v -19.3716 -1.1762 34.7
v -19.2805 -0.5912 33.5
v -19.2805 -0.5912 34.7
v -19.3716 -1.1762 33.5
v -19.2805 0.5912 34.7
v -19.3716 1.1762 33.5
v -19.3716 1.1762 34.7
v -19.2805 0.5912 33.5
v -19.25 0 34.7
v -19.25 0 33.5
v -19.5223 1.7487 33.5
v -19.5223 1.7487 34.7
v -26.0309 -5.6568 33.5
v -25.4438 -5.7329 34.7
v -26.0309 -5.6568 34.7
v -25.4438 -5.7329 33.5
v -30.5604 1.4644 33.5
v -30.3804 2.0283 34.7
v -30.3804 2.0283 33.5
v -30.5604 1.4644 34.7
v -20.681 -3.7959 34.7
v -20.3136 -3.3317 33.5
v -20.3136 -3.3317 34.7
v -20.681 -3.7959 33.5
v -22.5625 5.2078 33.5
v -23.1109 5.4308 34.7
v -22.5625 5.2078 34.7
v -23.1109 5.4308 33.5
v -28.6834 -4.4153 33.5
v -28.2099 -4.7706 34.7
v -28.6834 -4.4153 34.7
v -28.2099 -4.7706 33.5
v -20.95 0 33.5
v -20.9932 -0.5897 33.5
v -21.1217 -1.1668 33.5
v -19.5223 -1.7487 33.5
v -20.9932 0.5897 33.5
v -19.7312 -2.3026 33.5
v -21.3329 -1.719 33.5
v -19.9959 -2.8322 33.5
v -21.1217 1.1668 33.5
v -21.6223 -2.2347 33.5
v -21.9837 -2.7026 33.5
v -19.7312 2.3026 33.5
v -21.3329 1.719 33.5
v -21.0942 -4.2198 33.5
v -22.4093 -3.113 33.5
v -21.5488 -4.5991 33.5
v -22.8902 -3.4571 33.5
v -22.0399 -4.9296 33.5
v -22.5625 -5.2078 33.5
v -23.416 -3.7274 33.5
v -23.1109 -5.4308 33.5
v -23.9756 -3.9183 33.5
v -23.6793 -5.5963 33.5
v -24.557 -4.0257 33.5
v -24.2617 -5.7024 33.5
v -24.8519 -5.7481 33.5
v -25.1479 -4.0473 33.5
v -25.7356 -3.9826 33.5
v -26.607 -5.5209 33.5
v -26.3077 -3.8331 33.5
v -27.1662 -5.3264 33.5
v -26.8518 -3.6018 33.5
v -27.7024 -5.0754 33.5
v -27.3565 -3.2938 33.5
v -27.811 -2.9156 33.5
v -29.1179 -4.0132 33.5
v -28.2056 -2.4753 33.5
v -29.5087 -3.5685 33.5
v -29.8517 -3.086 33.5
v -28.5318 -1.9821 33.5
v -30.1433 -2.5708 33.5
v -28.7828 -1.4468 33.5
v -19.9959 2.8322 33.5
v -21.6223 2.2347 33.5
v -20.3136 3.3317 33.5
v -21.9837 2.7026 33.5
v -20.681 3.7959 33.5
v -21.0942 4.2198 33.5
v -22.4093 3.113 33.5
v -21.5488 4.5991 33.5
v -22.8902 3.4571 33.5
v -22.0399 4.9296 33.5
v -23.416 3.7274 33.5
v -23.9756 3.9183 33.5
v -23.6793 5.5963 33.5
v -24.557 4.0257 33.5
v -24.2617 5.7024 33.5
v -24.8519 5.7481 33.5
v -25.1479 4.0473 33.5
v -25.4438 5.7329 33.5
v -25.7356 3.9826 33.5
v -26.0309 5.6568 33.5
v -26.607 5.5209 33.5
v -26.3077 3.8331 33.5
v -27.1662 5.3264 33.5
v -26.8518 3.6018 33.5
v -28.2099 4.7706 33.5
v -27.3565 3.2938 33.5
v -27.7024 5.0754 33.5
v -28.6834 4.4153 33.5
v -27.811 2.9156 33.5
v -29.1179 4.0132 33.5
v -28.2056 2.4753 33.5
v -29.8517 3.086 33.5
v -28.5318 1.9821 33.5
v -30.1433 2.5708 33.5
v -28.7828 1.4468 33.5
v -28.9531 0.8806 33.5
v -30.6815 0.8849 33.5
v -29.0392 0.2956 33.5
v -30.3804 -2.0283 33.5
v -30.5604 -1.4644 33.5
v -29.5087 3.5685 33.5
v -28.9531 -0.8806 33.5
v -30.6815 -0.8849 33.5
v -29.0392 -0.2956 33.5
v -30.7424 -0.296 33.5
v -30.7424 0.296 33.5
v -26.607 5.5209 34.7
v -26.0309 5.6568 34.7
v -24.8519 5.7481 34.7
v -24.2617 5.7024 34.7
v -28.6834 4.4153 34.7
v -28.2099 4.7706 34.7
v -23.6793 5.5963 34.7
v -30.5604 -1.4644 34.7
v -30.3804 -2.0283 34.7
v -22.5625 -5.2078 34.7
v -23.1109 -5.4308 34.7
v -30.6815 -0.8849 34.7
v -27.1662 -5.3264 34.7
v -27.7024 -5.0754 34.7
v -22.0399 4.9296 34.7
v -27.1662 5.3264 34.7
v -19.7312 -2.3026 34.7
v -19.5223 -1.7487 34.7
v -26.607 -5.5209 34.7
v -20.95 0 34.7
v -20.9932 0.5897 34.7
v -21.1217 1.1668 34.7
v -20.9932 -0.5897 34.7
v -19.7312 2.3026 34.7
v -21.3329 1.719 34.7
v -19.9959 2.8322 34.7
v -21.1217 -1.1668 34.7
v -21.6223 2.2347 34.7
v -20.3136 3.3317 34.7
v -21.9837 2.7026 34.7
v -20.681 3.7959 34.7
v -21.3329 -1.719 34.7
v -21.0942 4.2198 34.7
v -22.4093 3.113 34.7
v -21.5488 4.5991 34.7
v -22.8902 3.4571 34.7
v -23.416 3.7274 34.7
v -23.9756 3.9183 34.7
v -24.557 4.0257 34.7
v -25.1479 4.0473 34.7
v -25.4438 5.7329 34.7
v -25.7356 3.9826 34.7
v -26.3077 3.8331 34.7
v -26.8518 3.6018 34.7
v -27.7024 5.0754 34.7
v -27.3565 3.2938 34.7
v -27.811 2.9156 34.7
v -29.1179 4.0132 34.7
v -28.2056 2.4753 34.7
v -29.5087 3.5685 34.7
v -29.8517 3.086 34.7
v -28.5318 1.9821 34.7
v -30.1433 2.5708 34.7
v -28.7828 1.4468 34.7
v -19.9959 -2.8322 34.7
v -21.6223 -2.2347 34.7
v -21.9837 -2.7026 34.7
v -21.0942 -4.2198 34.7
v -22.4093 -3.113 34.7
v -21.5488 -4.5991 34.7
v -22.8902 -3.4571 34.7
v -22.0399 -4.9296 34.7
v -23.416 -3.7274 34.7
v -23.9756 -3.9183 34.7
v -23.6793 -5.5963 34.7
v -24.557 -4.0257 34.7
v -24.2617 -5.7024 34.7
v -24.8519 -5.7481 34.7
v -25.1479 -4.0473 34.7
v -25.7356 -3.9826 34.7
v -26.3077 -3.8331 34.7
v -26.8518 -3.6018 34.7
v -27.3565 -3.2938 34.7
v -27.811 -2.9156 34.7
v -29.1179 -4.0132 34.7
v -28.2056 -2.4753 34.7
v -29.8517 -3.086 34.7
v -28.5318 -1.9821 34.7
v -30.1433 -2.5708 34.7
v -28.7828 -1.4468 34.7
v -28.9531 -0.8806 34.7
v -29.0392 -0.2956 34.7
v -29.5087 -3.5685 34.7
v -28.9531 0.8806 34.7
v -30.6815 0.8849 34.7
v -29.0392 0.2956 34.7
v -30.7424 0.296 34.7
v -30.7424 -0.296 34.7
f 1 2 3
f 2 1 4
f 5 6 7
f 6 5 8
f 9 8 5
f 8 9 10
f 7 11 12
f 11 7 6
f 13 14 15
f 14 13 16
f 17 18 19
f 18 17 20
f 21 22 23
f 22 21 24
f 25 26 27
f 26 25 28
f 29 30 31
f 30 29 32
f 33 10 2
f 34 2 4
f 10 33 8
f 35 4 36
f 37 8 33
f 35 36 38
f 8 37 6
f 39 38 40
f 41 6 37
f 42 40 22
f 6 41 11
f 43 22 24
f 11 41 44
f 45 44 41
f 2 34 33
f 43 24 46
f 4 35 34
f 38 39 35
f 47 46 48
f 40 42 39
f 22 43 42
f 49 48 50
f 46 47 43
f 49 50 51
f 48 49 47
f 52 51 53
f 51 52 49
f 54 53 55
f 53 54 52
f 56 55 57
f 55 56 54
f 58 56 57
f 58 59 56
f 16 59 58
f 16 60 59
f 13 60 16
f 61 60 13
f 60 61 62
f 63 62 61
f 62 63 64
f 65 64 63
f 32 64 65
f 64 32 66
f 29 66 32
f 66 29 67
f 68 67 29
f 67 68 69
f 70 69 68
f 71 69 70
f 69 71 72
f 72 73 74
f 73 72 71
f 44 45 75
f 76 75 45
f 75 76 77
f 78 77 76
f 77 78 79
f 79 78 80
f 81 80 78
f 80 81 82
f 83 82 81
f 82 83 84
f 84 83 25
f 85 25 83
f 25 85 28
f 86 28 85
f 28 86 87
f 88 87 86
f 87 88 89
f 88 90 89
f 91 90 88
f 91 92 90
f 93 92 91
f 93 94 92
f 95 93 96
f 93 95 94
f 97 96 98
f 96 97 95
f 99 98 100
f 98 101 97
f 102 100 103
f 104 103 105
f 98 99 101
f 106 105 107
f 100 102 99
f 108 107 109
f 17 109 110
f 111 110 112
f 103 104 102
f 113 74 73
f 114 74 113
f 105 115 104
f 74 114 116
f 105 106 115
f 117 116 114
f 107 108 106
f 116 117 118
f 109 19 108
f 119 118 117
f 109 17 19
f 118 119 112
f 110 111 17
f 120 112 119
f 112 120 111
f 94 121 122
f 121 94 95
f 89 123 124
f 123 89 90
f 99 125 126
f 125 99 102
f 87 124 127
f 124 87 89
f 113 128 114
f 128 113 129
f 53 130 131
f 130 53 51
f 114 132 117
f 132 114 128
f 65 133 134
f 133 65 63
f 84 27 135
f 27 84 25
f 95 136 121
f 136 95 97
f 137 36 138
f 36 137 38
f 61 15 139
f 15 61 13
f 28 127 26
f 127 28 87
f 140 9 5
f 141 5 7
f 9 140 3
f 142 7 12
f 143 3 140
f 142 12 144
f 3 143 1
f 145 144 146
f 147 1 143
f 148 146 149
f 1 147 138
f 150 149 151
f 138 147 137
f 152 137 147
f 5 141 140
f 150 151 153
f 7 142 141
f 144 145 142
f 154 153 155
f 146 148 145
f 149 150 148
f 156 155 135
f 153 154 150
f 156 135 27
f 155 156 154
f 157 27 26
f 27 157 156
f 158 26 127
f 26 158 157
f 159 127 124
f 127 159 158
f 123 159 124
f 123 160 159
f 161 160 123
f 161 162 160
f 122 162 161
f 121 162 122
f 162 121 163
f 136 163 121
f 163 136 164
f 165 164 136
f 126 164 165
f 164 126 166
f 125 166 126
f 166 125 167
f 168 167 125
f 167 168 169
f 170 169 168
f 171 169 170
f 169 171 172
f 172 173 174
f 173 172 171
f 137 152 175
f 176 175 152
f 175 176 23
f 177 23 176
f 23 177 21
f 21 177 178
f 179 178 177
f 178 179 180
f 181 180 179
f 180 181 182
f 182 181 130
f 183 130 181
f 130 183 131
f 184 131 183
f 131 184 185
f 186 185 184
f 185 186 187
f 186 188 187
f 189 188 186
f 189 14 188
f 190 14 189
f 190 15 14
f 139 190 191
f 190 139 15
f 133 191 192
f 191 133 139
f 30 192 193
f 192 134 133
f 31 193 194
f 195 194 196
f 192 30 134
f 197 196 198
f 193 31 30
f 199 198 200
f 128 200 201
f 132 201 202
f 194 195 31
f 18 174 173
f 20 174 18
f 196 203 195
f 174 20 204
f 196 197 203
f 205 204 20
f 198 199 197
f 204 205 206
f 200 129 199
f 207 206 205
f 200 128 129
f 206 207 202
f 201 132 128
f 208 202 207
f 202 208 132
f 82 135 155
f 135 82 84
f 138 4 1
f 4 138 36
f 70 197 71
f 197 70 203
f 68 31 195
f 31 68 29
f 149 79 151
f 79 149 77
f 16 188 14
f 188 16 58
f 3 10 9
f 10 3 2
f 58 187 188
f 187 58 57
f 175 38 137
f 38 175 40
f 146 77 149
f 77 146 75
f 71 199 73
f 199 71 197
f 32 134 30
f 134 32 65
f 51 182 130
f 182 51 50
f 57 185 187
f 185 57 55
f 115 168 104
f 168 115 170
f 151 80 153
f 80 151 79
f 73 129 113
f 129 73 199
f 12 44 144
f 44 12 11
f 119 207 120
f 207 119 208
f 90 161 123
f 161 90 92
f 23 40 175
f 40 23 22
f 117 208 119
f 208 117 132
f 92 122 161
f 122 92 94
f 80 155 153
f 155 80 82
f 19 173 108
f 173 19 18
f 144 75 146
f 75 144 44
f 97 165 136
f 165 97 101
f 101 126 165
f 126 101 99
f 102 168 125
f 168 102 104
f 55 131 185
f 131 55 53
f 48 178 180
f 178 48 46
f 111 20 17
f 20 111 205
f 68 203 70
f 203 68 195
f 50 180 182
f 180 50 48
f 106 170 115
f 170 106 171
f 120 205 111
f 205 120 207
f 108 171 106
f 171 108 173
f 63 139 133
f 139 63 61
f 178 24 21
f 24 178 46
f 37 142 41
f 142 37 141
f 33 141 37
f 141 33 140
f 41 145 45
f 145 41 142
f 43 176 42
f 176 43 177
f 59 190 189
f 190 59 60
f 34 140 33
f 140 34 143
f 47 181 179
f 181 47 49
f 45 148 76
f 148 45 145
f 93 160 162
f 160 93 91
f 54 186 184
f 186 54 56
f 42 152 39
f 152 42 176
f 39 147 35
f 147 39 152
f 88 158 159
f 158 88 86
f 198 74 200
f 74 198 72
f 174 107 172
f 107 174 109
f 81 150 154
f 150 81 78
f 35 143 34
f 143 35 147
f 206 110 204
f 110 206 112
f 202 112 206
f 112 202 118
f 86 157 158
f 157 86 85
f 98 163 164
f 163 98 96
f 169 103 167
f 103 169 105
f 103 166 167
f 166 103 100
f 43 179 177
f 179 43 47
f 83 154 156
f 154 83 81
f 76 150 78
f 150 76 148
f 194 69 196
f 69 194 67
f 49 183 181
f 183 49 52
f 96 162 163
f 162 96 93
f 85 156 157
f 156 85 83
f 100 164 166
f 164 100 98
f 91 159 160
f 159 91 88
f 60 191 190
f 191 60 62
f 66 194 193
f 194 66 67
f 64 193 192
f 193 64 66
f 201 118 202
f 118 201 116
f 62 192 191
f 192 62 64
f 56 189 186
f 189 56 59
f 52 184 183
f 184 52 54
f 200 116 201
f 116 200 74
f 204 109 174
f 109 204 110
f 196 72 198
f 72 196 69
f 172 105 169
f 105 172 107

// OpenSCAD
// file: ../../lib/common.scad
// ============================================================================
//  Вспомогательные модули общего назначения.
//  Подключать через use <lib/common.scad> — файл не содержит параметров
//  проекта и ни от чего не зависит.
// ============================================================================

_eps = 0.01;

// --------------------------------------------------------------------- 2D ---
// Прямоугольник со скруглёнными углами, по центру
module rrect(w, d, r) {
    rr = min(r, w/2 - _eps, d/2 - _eps);
    if (rr > 0) offset(r = rr) square([w - 2*rr, d - 2*rr], center = true);
    else square([w, d], center = true);
}

// --------------------------------------------------------------------- 3D ---
// Коробка со скруглением ТОЛЬКО вертикальных рёбер: нижние и верхние острые
module rounded_box(w, d, h, r) linear_extrude(height = h) rrect(w, d, r);

// Цилиндр с фасками на торцах (снимает «слоновью ногу» и облегчает посадку)
module chamfered_cyl(d, h, ch = 0.6, bottom = true, top = true) {
    r  = d/2;
    cb = bottom ? min(ch, h/2) : 0;
    ct = top    ? min(ch, h/2) : 0;
    if (cb <= 0 && ct <= 0) cylinder(d = d, h = h);
    else rotate_extrude(angle = 360) polygon(concat(
        [[0, 0]],
        cb > 0 ? [[r - cb, 0], [r, cb]] : [[r, 0]],
        ct > 0 ? [[r, h - ct], [r - ct, h]] : [[r, h]],
        [[0, h]]));
}

// Труба
module tube(od, id, h) difference() {
    cylinder(d = od, h = h);
    translate([0, 0, -_eps]) cylinder(d = id, h = h + 2*_eps);
}

// Сквозное отверстие, растянутое вверх-вниз для гарантированного вычитания
module thru(d, h) translate([0, 0, -_eps]) cylinder(d = d, h = h + 2*_eps);

// Потайное отверстие под саморез с конической головкой.
// Пластина занимает z = [0 .. t], головка утапливается сверху,
// саморез идёт вниз (в ответную стойку).
module countersunk_hole(free_d, head_d, t, down = 30) {
    cone_h = (head_d - free_d)/2;    // головка 90 градусов
    union() {
        translate([0, 0, -down]) cylinder(d = free_d, h = down + t - cone_h + _eps);
        translate([0, 0, t - cone_h]) cylinder(d1 = free_d, d2 = head_d, h = cone_h);
    }
}

// Паз (щелевое отверстие) длиной len по X, сквозной по высоте h
module slot(len, d, h) hull() for (s = [-1, 1])
    translate([s*(len - d)/2, 0, 0]) cylinder(d = d, h = h);

// Стойка под саморез: цилиндр с пилотным отверстием сверху.
// Снизу фаски нет — стойка растёт из дна детали.
module screw_boss(od, h, pilot_d, pilot_depth, ch = 0.6) difference() {
    chamfered_cyl(od, h, ch = ch, bottom = false, top = true);
    translate([0, 0, h - pilot_depth]) cylinder(d = pilot_d, h = pilot_depth + _eps);
}

// Треугольная косынка в плоскости XZ (катеты l по X и h по Z), толщина t по Y
module gusset(l, h, t) translate([0, -t/2, 0]) linear_extrude(height = t)
    polygon([[0, 0], [l, 0], [0, h]]);

// Конусное гнездо под заточенный винт-ось (ось Z вниз от z=0)
module cone_seat(d, depth) translate([0, 0, -depth])
    cylinder(d1 = 0.2, d2 = d, h = depth + _eps);

// Канавка под круглый пассик: тор, вычитаемый из обода
module belt_groove(pulley_d, groove_r) rotate_extrude(angle = 360)
    translate([pulley_d/2, 0]) circle(r = groove_r);

// Сетка облегчающих отверстий по кругу
module radial_holes(n, r, d, h) for (i = [0 : n - 1])
    rotate([0, 0, i*360/n]) translate([r, 0, 0]) thru(d, h);
// main file
// ============================================================================
//  ШАЙБА ПОД КОЛЕСОМ ВАЛА ДИСКА
//
//  Передаёт вес диска с колеса на внутреннее кольцо верхнего подшипника
//  и не даёт колесу тереться о башню. Наружный диаметр меньше внутреннего
//  кольца — в наружное кольцо и пыльник шайба не упирается.
//
//  Печать: плашмя.
// ============================================================================

include <../drive_params.scad>
use <../../lib/common.scad>

module drive_spacer() {
    translate([spindle_pos[0], spindle_pos[1], spindle_tower_top])
        tube(brg_inner_ring_d, spindle_d + rod_bore_clr + rod_ring_clr, spacer_t);
}

drive_spacer();
